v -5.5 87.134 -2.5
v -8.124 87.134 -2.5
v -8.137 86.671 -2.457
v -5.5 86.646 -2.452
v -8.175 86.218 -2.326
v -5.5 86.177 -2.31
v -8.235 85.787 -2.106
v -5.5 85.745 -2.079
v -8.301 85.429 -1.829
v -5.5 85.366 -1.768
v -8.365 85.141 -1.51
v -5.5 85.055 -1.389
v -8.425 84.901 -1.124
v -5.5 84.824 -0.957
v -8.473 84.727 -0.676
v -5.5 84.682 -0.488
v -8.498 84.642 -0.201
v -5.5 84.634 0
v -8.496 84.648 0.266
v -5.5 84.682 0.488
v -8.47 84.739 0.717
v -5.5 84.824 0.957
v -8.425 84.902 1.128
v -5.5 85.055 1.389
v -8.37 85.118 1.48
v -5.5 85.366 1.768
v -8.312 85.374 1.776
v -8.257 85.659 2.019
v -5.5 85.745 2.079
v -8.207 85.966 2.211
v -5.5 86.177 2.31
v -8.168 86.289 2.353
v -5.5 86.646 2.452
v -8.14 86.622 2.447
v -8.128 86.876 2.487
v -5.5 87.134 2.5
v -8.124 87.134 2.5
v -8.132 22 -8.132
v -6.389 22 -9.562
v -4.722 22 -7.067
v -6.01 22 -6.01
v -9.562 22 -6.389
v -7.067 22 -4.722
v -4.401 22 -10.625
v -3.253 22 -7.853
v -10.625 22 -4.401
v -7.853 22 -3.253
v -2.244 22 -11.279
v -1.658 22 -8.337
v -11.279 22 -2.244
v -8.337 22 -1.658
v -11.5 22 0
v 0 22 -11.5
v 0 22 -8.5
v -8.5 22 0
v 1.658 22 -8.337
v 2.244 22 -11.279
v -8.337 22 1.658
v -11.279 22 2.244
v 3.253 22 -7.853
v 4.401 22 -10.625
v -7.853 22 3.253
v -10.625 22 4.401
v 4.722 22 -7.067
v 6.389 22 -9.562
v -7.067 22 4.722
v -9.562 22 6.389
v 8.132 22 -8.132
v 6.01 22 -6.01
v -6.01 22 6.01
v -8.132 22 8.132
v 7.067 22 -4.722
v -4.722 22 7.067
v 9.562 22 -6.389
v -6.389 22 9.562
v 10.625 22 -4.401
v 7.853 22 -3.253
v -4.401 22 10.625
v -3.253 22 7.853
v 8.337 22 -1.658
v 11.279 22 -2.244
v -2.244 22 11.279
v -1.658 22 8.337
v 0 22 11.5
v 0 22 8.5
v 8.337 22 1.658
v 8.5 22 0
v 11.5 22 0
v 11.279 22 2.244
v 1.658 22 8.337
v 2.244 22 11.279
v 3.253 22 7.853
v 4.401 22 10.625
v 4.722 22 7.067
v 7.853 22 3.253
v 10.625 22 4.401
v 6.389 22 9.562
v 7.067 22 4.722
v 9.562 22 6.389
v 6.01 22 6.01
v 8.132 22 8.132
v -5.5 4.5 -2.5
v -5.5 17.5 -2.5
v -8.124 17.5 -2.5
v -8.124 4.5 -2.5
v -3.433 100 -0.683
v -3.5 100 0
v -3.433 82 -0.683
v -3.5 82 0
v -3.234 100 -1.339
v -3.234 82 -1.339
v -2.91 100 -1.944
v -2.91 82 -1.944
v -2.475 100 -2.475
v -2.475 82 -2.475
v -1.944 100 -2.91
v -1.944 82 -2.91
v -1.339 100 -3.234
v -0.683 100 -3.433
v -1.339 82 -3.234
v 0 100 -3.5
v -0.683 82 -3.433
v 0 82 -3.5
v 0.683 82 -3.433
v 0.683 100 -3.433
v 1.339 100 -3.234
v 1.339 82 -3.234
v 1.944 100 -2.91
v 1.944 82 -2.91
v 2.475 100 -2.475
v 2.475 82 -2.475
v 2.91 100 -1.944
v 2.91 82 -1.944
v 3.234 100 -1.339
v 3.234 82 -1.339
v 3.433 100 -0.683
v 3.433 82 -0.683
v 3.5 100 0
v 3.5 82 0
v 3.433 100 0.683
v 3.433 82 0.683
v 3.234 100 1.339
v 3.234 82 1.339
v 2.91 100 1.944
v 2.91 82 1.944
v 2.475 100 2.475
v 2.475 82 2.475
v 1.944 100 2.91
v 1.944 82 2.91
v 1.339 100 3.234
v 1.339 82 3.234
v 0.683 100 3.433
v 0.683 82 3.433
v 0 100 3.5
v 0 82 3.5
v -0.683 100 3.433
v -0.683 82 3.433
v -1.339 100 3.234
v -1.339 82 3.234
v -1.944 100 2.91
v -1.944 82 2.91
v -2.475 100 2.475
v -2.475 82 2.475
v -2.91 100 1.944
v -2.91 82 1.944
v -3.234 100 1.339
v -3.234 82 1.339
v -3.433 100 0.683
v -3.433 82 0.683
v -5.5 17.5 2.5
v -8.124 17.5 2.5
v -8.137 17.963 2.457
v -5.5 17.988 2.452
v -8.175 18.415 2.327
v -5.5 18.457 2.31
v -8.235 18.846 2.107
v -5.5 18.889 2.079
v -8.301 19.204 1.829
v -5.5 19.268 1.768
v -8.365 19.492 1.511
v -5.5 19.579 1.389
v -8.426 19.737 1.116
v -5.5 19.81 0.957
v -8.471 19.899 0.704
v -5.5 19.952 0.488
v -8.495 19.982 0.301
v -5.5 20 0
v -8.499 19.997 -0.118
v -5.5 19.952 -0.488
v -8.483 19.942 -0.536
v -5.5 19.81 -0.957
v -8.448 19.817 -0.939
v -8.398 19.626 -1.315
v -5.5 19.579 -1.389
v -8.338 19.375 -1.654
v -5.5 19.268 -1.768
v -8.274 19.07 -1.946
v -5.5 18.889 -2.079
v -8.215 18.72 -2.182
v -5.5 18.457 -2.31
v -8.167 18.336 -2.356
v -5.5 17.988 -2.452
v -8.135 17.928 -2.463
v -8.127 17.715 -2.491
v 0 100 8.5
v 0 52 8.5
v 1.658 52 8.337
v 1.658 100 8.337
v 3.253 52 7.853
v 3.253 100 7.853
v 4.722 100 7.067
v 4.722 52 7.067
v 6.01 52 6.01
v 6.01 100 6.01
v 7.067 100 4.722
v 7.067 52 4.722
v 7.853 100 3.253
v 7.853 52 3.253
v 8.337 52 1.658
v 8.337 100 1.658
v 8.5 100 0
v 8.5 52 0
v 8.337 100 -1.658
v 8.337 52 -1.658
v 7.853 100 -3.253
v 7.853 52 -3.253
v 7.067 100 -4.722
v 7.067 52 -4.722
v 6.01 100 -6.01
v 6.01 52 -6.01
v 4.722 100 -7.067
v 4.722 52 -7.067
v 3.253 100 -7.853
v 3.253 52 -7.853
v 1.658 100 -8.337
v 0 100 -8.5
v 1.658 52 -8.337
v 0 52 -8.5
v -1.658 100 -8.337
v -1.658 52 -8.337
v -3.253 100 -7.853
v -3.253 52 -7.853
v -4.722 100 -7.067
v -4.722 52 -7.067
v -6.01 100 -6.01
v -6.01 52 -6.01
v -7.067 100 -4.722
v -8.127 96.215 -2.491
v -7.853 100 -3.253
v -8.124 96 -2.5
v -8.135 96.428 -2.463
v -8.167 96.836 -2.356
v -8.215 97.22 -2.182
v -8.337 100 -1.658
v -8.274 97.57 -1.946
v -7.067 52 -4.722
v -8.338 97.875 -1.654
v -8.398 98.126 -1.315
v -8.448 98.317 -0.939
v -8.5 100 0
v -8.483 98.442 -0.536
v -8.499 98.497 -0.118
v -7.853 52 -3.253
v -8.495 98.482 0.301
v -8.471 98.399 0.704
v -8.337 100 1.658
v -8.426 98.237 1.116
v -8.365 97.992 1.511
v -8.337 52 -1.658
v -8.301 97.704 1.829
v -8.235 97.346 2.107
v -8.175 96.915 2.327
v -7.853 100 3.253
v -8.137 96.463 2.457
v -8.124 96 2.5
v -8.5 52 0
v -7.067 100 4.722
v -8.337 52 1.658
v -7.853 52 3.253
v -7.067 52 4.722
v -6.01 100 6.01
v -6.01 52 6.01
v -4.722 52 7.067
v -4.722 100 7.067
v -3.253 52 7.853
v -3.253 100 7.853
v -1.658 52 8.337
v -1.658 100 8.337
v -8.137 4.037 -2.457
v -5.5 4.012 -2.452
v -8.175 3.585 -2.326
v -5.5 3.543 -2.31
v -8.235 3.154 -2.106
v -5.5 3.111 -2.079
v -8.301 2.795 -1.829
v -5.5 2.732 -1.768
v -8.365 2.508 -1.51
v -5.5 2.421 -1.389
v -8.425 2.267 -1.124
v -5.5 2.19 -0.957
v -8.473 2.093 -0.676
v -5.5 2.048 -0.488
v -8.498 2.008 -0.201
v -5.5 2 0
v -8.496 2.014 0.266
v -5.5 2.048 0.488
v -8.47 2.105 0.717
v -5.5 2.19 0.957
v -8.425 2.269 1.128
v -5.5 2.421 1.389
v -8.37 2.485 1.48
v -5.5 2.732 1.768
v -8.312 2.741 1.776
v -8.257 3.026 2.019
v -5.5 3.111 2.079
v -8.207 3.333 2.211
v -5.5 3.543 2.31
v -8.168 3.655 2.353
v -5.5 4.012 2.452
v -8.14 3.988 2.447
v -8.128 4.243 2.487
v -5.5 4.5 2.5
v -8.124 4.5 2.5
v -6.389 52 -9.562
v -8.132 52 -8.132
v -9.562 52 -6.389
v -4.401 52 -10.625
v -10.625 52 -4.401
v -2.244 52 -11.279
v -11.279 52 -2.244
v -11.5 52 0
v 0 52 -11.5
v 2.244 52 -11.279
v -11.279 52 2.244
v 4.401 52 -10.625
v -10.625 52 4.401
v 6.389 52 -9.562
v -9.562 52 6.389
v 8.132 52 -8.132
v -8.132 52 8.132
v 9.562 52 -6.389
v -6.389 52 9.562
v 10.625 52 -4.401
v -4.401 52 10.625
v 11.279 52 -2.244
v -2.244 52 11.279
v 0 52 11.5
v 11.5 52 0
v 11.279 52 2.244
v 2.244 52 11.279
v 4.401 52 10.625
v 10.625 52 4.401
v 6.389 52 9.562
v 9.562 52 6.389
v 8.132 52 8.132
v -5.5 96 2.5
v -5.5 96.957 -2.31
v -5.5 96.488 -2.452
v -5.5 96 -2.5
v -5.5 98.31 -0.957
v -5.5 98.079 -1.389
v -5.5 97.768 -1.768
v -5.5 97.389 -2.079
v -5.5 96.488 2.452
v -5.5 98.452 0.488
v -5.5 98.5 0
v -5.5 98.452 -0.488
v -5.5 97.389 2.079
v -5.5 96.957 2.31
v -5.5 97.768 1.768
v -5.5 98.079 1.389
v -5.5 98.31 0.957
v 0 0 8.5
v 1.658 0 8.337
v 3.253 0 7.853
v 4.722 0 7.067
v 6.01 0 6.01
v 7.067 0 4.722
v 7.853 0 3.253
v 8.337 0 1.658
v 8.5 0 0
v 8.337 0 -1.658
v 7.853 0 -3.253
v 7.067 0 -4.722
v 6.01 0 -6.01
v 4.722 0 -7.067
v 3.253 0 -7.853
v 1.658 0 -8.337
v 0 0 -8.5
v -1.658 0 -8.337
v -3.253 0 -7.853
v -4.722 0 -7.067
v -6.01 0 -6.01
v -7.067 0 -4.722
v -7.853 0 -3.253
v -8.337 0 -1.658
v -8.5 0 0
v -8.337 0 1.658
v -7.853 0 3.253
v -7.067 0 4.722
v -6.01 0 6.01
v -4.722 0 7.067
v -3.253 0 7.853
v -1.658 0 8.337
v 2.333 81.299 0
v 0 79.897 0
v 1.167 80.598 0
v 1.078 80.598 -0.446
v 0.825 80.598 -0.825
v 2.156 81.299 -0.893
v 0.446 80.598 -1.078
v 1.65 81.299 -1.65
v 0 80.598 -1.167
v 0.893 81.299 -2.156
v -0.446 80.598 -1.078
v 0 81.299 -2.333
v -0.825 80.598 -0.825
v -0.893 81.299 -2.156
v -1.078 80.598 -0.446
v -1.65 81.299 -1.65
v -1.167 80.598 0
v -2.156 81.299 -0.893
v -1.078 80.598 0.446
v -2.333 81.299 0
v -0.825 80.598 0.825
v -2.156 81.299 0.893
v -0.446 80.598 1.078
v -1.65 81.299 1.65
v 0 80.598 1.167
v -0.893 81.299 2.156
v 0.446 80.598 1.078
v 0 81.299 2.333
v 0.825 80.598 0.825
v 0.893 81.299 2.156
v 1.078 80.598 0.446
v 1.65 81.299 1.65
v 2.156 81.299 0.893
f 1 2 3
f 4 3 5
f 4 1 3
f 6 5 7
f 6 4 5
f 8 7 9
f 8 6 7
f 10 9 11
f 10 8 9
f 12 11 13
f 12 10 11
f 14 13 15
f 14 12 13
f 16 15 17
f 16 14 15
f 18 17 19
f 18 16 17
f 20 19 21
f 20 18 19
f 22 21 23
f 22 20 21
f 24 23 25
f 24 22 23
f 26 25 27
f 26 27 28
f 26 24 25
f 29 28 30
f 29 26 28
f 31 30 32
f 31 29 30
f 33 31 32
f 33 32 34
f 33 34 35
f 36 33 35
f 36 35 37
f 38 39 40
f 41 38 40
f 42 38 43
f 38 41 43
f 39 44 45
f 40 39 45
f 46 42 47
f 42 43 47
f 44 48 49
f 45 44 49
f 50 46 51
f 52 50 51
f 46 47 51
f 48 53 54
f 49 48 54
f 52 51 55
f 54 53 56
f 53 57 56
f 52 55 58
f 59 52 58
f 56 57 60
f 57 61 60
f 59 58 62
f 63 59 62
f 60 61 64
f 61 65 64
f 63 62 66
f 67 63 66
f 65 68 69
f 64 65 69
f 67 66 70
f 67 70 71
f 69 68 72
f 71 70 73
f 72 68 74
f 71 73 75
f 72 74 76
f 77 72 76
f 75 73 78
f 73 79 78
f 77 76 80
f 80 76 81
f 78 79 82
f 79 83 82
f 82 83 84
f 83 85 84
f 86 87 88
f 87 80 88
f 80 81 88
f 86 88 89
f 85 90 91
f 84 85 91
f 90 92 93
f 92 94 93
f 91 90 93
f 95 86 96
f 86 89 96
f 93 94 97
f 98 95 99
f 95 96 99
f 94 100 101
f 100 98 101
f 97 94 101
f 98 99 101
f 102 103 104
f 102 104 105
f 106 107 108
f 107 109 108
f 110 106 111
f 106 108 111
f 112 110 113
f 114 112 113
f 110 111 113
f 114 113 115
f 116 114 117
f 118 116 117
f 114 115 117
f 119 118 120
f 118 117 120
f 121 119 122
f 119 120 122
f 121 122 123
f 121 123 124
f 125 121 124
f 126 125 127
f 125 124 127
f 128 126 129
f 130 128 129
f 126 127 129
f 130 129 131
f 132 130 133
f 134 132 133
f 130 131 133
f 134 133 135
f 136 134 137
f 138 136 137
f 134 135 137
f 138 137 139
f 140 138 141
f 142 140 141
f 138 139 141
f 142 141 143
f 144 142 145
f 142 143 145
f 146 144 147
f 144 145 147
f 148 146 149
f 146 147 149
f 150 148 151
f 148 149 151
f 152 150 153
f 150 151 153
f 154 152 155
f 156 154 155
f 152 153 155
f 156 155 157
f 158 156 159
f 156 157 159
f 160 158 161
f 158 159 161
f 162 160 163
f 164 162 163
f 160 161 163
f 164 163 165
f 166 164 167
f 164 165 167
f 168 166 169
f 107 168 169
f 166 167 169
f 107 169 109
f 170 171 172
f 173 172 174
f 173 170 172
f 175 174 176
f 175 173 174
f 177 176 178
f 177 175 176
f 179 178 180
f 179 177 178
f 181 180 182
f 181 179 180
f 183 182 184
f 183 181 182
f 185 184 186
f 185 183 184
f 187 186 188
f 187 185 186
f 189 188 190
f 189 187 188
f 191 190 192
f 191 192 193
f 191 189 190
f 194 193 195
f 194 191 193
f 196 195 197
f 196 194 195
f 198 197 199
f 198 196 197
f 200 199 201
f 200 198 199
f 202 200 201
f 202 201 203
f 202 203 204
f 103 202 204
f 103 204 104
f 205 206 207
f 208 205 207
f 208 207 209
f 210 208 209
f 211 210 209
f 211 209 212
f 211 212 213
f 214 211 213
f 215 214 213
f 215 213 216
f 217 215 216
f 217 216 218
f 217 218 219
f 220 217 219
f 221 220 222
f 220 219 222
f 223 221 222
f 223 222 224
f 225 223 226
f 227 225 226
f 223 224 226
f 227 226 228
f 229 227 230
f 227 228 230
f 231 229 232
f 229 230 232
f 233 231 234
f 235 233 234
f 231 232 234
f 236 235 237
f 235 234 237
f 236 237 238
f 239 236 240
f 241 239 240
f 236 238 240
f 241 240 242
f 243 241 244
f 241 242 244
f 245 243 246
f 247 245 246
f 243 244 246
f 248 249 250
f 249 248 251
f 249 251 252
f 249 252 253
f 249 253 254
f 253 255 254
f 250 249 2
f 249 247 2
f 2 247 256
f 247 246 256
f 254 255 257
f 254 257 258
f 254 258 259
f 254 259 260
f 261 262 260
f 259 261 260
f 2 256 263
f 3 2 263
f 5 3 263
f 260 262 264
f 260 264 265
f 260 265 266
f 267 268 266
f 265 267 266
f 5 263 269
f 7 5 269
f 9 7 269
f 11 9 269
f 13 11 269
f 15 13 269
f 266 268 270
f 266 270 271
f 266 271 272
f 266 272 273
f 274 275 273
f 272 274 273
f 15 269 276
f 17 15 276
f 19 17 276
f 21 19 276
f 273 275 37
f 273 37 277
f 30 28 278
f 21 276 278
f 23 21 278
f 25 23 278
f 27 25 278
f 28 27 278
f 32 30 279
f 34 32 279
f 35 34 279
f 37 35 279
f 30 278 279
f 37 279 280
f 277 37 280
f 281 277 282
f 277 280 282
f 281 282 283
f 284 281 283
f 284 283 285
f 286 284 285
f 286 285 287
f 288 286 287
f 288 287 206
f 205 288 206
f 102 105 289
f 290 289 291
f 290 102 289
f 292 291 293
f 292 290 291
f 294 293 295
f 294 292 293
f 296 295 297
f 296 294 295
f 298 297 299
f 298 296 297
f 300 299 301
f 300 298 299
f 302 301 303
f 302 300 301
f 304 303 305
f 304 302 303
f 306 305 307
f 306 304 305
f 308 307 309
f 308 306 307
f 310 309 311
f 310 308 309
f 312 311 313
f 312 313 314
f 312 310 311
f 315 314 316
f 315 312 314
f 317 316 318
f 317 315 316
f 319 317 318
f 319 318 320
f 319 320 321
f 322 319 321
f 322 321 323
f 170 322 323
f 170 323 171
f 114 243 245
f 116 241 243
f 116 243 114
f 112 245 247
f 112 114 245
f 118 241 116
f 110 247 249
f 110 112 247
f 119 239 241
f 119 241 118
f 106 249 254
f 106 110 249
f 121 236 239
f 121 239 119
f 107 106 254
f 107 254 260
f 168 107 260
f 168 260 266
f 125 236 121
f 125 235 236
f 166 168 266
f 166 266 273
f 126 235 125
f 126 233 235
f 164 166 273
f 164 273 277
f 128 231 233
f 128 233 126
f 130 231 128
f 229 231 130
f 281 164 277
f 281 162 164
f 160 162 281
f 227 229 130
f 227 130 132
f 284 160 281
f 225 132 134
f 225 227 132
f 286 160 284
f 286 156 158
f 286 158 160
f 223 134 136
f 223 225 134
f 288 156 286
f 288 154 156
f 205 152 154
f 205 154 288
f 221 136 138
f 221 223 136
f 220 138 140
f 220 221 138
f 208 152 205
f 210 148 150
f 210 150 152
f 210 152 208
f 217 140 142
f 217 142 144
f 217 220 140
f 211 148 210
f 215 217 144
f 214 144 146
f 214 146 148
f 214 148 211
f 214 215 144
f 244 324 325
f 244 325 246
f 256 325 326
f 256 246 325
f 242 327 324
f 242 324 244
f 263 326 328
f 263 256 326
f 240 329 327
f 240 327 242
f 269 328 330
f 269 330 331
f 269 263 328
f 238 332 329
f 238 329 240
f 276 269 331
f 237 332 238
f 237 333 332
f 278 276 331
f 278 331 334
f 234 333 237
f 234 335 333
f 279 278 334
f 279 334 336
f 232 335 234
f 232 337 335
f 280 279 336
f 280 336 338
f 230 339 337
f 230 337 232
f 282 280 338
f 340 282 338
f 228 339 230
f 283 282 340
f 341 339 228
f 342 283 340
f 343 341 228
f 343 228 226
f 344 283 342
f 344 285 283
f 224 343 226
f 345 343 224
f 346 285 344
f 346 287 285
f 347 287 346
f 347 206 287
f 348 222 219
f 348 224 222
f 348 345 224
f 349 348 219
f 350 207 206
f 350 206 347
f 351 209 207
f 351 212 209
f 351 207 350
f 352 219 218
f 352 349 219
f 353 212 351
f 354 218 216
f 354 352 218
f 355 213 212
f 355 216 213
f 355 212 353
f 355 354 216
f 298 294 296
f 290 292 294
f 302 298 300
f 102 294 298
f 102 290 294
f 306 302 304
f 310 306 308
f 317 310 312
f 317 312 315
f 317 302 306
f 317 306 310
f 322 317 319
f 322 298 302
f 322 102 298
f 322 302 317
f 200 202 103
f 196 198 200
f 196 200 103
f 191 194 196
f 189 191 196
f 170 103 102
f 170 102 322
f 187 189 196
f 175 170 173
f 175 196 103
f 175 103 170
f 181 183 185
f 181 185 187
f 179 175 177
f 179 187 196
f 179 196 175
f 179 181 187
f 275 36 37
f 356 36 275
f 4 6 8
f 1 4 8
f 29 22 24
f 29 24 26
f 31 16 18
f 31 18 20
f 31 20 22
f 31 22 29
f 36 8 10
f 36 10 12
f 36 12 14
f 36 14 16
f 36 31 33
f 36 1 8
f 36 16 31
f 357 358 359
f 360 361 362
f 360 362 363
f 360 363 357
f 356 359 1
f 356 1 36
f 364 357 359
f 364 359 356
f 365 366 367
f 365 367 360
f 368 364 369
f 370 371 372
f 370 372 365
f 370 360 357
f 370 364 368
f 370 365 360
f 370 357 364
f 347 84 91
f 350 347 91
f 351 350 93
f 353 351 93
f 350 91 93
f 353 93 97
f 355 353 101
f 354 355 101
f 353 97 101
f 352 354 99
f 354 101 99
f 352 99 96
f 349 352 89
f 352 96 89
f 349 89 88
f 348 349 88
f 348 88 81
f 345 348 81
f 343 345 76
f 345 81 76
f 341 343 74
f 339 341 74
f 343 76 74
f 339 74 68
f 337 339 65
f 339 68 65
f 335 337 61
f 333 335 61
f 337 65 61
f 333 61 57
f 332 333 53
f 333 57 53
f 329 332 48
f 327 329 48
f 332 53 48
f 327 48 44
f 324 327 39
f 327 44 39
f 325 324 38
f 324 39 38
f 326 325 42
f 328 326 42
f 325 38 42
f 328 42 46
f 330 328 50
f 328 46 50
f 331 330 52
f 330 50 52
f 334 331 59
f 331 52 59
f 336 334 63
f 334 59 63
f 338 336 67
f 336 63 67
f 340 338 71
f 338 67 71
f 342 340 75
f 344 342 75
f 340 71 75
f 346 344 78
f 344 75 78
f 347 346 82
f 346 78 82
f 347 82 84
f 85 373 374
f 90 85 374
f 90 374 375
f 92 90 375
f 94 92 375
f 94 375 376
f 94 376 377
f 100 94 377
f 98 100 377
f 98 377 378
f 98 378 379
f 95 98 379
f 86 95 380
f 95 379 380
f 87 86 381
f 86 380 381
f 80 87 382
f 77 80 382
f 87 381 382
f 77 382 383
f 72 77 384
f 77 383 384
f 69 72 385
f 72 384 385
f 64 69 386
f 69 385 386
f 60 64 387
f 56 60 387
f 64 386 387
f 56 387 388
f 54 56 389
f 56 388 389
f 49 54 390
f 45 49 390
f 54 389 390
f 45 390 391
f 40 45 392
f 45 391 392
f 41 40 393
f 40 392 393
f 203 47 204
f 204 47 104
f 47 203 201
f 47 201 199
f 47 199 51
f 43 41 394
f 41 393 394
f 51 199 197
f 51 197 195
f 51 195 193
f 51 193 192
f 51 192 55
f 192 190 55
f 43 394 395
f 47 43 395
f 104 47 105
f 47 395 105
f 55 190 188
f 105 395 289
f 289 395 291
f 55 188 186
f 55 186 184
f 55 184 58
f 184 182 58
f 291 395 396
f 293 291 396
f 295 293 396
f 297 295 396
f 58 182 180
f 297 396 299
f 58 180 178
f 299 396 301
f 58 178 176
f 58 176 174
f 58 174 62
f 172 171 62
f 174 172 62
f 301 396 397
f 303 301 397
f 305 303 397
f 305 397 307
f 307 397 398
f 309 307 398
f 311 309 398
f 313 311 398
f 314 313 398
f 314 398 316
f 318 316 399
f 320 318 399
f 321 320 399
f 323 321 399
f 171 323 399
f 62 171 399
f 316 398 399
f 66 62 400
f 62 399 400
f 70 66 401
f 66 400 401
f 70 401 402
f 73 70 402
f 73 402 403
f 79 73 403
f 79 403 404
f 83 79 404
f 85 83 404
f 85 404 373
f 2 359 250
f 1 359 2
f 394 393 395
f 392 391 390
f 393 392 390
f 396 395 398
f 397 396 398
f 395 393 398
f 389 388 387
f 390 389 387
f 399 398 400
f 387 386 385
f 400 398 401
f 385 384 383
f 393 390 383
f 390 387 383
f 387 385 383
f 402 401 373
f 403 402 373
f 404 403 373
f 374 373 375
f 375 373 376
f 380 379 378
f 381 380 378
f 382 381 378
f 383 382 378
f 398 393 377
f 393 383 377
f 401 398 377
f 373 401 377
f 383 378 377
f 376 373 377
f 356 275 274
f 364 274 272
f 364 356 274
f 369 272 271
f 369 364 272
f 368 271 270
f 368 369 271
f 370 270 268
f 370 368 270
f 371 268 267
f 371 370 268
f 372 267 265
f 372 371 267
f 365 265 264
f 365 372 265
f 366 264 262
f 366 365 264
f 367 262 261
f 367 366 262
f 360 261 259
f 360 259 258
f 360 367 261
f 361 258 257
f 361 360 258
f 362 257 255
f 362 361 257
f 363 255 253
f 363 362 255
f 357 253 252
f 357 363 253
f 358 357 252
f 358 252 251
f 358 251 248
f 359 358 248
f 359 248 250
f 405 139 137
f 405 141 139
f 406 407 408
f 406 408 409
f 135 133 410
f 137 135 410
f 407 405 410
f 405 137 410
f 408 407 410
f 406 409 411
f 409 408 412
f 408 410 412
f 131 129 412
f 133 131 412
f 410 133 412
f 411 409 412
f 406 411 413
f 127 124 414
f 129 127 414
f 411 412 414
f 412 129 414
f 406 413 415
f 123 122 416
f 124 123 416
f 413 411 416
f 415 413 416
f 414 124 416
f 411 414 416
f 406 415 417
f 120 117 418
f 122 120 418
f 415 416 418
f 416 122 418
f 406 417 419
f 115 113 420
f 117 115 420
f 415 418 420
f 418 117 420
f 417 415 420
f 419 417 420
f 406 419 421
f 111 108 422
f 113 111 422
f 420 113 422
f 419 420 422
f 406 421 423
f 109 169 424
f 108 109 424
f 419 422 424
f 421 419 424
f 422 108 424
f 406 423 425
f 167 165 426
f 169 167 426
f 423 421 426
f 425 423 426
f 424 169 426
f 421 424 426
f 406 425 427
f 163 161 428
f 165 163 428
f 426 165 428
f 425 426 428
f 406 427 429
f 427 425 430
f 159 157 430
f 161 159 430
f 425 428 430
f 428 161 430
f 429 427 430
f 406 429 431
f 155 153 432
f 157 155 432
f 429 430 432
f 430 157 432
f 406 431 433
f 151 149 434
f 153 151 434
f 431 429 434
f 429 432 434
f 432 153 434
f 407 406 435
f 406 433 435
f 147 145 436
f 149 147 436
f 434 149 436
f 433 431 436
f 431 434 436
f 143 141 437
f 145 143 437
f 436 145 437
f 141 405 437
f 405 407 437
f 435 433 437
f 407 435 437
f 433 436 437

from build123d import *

# Parameters (mm, degrees)
SKETCH_1_R          = 8.5
EXTRUDE_1_DEPTH     = 22
SKETCH_2_R          = 11.5
EXTRUDE_2_DEPTH     = 30
SKETCH_3_R          = 8.5
EXTRUDE_3_DEPTH     = 48
CUT_EXTRUDE_START   = -5.5
CUT_EXTRUDE_1_DEPTH = 48
CUT_EXTRUDE_2_DEPTH = 5.5
M8X1_0_1_D          = 7
M8X1_0_1_DEPTH      = 18
M8X1_0_1_TIP        = 2.103012167


with BuildPart() as part:
    # 草图1 → 凸台-拉伸1 (new body)
    with BuildSketch(Plane(origin=(0, 0, 0), x_dir=(1, 0, 0), z_dir=(0, 1, 0))):
        with Locations(Location((0, 0, 0), (0, 0, 270))):
            Circle(SKETCH_1_R)
    extrude(amount=EXTRUDE_1_DEPTH)

    # 草图2 → 凸台-拉伸2 (add)
    with BuildSketch(Plane(origin=(0, 22, 0), x_dir=(1, 0, 0), z_dir=(0, 1, 0))):
        with Locations(Location((0, 0, 0), (0, 0, 270))):
            Circle(SKETCH_2_R)
    extrude(amount=EXTRUDE_2_DEPTH)

    # 草图3 → 凸台-拉伸3 (add)
    with BuildSketch(Plane(origin=(0, 52, 0), x_dir=(1, 0, 0), z_dir=(0, 1, 0))):
        with Locations(Location((0, 0, 0), (0, 0, 270))):
            Circle(SKETCH_3_R)
    extrude(amount=EXTRUDE_3_DEPTH)

    # 草图4 → 切除-拉伸1 (cut)
    with BuildSketch(Plane(origin=(0, 0, 0), x_dir=(0, 0, -1), z_dir=(1, 0, 0)).offset(CUT_EXTRUDE_START)):
        with BuildLine():
            Line((2.5, 17.5), (2.5, 4.5))
            ThreePointArc((2.5, 4.5), (0, 2), (-2.5, 4.5))
            Line((-2.5, 4.5), (-2.5, 17.5))
            ThreePointArc((-2.5, 17.5), (0, 20), (2.5, 17.5))
        make_face()
    extrude(amount=-CUT_EXTRUDE_1_DEPTH, mode=Mode.SUBTRACT)

    # 草图5 → 切除-拉伸2 (cut)
    with BuildSketch(Plane(origin=(0, 0, 0), x_dir=(0, 0, -1), z_dir=(1, 0, 0)).offset(CUT_EXTRUDE_START)):
        with BuildLine():
            Line((2.5, 96), (2.5, 87.133575026))
            ThreePointArc((2.5, 87.133575026), (0, 84.633575026), (-2.5, 87.133575026))
            Line((-2.5, 87.133575026), (-2.5, 96))
            ThreePointArc((-2.5, 96), (0, 98.5), (2.5, 96))
        make_face()
    extrude(amount=-CUT_EXTRUDE_2_DEPTH, mode=Mode.SUBTRACT)

    # M8x1.0 螺纹孔1
    with Locations(Plane(origin=(0, 100, 0), x_dir=(1, 0, 0), z_dir=(0, 1, 0))):
        with Locations((0, 0)):
            Hole(M8X1_0_1_D / 2, depth=M8X1_0_1_DEPTH)
            with Locations((0, 0, -(M8X1_0_1_DEPTH + M8X1_0_1_TIP / 2))):  # 118° drill point
                Cone(0, M8X1_0_1_D / 2, M8X1_0_1_TIP, mode=Mode.SUBTRACT)


solid = part.part
